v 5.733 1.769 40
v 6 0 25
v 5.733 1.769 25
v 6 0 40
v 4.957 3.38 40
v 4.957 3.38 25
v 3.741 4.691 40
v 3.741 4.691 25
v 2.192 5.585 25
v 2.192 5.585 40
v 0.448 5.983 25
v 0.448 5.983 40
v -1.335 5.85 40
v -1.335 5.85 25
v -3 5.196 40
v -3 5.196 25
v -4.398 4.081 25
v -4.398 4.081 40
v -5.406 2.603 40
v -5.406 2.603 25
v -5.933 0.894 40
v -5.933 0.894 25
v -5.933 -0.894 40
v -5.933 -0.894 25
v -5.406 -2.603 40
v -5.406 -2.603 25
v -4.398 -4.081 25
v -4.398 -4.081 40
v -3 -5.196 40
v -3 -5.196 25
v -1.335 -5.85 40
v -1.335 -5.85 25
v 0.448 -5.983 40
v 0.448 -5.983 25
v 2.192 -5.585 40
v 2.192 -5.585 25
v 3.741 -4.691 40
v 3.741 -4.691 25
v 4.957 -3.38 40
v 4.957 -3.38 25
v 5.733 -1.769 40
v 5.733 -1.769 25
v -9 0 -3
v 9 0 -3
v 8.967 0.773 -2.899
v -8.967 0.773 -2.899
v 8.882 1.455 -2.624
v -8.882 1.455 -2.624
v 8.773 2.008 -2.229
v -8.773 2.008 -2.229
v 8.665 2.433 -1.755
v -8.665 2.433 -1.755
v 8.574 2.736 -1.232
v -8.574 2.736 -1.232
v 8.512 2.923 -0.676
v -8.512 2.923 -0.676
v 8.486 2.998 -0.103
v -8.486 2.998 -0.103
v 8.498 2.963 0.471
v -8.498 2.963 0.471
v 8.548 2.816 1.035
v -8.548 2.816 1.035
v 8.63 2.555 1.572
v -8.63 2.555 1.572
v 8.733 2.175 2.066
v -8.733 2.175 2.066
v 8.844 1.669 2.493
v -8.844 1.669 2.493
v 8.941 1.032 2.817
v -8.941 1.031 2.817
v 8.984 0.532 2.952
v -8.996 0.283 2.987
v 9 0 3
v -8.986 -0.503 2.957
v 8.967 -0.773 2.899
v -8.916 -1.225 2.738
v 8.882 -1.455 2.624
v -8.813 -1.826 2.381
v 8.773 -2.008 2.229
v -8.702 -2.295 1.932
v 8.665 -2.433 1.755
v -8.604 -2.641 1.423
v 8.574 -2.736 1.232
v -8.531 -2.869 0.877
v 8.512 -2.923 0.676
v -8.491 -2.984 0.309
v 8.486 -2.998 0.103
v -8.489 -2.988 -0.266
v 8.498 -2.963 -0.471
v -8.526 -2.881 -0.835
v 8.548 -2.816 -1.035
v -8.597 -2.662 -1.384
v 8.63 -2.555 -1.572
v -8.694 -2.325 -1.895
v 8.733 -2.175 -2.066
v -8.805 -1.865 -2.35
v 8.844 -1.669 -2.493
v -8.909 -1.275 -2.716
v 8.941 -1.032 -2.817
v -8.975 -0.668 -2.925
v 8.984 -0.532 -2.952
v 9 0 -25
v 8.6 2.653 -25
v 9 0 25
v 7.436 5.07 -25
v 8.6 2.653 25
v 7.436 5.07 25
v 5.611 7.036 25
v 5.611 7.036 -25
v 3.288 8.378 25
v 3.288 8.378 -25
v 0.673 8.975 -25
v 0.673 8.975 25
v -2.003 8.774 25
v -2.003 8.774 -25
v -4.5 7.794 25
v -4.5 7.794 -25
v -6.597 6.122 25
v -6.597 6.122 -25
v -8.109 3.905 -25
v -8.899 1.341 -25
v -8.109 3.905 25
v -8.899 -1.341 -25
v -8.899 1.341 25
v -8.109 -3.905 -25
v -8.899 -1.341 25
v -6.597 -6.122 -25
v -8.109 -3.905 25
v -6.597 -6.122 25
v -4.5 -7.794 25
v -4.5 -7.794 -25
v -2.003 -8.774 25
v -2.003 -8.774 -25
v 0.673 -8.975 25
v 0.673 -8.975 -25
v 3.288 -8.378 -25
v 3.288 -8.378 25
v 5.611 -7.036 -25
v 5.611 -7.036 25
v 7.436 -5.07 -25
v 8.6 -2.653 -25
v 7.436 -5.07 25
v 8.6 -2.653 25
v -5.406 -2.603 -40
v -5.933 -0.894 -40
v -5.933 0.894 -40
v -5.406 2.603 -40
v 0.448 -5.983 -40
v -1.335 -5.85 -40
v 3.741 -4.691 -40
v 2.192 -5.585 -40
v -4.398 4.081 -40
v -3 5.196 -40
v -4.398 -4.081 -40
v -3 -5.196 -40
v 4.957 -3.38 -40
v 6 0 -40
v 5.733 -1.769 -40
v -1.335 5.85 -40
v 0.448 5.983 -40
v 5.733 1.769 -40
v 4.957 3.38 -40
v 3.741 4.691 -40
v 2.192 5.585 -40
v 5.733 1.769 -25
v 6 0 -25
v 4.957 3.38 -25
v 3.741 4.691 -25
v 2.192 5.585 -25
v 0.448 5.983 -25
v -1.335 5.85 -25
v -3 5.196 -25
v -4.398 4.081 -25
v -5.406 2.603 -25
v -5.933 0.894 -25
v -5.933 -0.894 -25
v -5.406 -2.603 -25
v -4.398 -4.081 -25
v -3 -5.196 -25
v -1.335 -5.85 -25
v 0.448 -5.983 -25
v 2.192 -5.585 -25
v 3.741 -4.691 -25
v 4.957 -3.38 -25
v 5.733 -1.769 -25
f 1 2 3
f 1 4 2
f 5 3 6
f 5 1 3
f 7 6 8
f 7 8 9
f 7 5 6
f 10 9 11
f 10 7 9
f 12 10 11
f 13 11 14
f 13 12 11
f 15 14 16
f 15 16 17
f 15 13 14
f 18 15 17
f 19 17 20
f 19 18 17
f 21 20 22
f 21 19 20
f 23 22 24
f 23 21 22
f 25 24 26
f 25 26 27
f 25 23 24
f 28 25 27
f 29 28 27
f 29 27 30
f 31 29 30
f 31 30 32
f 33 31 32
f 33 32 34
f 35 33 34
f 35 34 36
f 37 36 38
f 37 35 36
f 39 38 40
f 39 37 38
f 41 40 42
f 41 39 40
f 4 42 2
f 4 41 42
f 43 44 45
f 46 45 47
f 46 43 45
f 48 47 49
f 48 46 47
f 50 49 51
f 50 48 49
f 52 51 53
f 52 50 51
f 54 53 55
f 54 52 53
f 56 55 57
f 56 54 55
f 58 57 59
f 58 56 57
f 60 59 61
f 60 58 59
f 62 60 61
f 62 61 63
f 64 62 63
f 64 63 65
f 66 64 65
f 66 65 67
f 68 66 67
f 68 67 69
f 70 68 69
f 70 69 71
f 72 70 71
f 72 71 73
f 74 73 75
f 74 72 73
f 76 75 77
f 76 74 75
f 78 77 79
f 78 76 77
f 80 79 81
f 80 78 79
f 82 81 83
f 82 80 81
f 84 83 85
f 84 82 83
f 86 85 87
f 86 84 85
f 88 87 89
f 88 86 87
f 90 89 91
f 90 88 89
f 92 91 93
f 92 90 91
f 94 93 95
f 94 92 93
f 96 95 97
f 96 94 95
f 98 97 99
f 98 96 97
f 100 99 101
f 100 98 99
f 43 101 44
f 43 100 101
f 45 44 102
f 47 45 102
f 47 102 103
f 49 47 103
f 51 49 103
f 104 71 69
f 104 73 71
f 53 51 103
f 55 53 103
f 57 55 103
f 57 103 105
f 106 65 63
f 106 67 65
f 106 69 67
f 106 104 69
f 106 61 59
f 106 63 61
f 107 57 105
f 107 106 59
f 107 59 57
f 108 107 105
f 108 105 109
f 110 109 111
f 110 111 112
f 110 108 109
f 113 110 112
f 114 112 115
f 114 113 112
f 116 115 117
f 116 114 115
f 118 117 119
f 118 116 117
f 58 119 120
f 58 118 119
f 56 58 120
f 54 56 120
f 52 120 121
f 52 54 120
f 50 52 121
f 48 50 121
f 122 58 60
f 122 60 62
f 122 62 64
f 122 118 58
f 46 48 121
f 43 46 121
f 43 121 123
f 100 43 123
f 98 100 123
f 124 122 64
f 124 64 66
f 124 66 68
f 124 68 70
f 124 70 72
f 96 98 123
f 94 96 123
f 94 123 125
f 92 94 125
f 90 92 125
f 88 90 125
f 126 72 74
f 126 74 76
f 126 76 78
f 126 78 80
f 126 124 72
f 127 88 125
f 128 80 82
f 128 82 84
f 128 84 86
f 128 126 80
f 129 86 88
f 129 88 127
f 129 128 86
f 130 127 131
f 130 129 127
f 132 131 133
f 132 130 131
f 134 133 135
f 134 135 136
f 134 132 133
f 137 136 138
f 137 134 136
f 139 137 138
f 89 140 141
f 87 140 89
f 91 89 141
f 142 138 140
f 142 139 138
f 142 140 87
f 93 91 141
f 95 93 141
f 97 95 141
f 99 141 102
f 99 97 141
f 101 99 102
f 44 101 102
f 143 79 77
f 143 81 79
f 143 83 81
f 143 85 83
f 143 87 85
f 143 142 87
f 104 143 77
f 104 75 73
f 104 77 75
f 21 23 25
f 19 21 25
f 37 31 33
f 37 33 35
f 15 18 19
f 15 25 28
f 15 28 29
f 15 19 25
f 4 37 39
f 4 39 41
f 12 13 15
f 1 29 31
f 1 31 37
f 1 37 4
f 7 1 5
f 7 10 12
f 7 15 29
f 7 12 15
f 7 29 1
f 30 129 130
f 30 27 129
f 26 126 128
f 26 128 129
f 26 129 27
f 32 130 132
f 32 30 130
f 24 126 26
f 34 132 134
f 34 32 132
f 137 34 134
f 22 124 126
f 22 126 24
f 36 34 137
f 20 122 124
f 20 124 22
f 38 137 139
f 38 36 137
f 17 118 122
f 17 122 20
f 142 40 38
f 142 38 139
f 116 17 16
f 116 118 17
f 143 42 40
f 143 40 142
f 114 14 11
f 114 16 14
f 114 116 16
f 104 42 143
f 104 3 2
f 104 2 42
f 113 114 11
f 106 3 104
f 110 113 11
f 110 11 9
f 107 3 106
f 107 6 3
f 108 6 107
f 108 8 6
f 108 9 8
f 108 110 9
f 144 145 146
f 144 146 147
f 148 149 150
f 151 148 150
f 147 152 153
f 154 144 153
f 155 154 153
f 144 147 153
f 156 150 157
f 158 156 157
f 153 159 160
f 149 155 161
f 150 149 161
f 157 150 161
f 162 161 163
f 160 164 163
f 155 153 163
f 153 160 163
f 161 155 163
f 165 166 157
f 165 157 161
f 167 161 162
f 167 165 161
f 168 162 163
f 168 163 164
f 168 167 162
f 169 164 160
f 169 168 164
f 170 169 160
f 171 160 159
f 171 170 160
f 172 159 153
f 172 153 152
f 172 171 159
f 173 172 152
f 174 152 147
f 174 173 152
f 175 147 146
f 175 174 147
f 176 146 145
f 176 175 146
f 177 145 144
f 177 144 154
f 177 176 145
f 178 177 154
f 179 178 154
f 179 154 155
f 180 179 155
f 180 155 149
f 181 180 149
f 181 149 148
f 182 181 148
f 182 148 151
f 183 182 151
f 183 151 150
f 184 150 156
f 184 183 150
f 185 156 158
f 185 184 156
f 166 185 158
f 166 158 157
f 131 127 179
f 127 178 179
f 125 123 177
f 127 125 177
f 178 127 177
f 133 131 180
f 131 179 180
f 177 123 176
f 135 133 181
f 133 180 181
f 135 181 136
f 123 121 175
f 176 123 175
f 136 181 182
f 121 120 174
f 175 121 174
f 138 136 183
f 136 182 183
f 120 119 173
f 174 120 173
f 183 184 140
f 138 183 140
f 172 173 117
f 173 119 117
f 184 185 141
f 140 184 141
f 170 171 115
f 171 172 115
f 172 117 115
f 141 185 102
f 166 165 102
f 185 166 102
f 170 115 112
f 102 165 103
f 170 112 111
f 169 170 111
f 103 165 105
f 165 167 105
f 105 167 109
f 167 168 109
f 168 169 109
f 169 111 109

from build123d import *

# Parameters (mm, degrees)
SKETCH1_R               = 9
BOSS_EXTRUDE1_DEPTH     = 25
SKETCH2_R               = 6
BOSS_EXTRUDE2_DEPTH     = 40
CUT_EXTRUDE2_DEPTH      = 42.976183724
CUT_EXTRUDE2_DEPTH_BACK = 42.976183724
SKETCH3_R               = 3


with BuildPart() as part:
    # Sketch1 → Boss-Extrude1 (new, symmetric)
    with BuildSketch(Plane.XY):
        Circle(SKETCH1_R)
    extrude(amount=BOSS_EXTRUDE1_DEPTH, both=True)

    # Sketch2 → Boss-Extrude2 (add, symmetric)
    with BuildSketch(Plane.XY):
        Circle(SKETCH2_R)
    extrude(amount=BOSS_EXTRUDE2_DEPTH, both=True)

    # Sketch3 → Cut-Extrude2 (cut, two sides: drawn at the far end of the back side and taken through both)
    with BuildSketch(Plane(origin=(0, 0, 0), x_dir=(0, 0, -1), z_dir=(1, 0, 0)).offset(-CUT_EXTRUDE2_DEPTH_BACK)):
        Circle(SKETCH3_R)
    extrude(amount=CUT_EXTRUDE2_DEPTH + CUT_EXTRUDE2_DEPTH_BACK, mode=Mode.SUBTRACT)


solid = part.part
